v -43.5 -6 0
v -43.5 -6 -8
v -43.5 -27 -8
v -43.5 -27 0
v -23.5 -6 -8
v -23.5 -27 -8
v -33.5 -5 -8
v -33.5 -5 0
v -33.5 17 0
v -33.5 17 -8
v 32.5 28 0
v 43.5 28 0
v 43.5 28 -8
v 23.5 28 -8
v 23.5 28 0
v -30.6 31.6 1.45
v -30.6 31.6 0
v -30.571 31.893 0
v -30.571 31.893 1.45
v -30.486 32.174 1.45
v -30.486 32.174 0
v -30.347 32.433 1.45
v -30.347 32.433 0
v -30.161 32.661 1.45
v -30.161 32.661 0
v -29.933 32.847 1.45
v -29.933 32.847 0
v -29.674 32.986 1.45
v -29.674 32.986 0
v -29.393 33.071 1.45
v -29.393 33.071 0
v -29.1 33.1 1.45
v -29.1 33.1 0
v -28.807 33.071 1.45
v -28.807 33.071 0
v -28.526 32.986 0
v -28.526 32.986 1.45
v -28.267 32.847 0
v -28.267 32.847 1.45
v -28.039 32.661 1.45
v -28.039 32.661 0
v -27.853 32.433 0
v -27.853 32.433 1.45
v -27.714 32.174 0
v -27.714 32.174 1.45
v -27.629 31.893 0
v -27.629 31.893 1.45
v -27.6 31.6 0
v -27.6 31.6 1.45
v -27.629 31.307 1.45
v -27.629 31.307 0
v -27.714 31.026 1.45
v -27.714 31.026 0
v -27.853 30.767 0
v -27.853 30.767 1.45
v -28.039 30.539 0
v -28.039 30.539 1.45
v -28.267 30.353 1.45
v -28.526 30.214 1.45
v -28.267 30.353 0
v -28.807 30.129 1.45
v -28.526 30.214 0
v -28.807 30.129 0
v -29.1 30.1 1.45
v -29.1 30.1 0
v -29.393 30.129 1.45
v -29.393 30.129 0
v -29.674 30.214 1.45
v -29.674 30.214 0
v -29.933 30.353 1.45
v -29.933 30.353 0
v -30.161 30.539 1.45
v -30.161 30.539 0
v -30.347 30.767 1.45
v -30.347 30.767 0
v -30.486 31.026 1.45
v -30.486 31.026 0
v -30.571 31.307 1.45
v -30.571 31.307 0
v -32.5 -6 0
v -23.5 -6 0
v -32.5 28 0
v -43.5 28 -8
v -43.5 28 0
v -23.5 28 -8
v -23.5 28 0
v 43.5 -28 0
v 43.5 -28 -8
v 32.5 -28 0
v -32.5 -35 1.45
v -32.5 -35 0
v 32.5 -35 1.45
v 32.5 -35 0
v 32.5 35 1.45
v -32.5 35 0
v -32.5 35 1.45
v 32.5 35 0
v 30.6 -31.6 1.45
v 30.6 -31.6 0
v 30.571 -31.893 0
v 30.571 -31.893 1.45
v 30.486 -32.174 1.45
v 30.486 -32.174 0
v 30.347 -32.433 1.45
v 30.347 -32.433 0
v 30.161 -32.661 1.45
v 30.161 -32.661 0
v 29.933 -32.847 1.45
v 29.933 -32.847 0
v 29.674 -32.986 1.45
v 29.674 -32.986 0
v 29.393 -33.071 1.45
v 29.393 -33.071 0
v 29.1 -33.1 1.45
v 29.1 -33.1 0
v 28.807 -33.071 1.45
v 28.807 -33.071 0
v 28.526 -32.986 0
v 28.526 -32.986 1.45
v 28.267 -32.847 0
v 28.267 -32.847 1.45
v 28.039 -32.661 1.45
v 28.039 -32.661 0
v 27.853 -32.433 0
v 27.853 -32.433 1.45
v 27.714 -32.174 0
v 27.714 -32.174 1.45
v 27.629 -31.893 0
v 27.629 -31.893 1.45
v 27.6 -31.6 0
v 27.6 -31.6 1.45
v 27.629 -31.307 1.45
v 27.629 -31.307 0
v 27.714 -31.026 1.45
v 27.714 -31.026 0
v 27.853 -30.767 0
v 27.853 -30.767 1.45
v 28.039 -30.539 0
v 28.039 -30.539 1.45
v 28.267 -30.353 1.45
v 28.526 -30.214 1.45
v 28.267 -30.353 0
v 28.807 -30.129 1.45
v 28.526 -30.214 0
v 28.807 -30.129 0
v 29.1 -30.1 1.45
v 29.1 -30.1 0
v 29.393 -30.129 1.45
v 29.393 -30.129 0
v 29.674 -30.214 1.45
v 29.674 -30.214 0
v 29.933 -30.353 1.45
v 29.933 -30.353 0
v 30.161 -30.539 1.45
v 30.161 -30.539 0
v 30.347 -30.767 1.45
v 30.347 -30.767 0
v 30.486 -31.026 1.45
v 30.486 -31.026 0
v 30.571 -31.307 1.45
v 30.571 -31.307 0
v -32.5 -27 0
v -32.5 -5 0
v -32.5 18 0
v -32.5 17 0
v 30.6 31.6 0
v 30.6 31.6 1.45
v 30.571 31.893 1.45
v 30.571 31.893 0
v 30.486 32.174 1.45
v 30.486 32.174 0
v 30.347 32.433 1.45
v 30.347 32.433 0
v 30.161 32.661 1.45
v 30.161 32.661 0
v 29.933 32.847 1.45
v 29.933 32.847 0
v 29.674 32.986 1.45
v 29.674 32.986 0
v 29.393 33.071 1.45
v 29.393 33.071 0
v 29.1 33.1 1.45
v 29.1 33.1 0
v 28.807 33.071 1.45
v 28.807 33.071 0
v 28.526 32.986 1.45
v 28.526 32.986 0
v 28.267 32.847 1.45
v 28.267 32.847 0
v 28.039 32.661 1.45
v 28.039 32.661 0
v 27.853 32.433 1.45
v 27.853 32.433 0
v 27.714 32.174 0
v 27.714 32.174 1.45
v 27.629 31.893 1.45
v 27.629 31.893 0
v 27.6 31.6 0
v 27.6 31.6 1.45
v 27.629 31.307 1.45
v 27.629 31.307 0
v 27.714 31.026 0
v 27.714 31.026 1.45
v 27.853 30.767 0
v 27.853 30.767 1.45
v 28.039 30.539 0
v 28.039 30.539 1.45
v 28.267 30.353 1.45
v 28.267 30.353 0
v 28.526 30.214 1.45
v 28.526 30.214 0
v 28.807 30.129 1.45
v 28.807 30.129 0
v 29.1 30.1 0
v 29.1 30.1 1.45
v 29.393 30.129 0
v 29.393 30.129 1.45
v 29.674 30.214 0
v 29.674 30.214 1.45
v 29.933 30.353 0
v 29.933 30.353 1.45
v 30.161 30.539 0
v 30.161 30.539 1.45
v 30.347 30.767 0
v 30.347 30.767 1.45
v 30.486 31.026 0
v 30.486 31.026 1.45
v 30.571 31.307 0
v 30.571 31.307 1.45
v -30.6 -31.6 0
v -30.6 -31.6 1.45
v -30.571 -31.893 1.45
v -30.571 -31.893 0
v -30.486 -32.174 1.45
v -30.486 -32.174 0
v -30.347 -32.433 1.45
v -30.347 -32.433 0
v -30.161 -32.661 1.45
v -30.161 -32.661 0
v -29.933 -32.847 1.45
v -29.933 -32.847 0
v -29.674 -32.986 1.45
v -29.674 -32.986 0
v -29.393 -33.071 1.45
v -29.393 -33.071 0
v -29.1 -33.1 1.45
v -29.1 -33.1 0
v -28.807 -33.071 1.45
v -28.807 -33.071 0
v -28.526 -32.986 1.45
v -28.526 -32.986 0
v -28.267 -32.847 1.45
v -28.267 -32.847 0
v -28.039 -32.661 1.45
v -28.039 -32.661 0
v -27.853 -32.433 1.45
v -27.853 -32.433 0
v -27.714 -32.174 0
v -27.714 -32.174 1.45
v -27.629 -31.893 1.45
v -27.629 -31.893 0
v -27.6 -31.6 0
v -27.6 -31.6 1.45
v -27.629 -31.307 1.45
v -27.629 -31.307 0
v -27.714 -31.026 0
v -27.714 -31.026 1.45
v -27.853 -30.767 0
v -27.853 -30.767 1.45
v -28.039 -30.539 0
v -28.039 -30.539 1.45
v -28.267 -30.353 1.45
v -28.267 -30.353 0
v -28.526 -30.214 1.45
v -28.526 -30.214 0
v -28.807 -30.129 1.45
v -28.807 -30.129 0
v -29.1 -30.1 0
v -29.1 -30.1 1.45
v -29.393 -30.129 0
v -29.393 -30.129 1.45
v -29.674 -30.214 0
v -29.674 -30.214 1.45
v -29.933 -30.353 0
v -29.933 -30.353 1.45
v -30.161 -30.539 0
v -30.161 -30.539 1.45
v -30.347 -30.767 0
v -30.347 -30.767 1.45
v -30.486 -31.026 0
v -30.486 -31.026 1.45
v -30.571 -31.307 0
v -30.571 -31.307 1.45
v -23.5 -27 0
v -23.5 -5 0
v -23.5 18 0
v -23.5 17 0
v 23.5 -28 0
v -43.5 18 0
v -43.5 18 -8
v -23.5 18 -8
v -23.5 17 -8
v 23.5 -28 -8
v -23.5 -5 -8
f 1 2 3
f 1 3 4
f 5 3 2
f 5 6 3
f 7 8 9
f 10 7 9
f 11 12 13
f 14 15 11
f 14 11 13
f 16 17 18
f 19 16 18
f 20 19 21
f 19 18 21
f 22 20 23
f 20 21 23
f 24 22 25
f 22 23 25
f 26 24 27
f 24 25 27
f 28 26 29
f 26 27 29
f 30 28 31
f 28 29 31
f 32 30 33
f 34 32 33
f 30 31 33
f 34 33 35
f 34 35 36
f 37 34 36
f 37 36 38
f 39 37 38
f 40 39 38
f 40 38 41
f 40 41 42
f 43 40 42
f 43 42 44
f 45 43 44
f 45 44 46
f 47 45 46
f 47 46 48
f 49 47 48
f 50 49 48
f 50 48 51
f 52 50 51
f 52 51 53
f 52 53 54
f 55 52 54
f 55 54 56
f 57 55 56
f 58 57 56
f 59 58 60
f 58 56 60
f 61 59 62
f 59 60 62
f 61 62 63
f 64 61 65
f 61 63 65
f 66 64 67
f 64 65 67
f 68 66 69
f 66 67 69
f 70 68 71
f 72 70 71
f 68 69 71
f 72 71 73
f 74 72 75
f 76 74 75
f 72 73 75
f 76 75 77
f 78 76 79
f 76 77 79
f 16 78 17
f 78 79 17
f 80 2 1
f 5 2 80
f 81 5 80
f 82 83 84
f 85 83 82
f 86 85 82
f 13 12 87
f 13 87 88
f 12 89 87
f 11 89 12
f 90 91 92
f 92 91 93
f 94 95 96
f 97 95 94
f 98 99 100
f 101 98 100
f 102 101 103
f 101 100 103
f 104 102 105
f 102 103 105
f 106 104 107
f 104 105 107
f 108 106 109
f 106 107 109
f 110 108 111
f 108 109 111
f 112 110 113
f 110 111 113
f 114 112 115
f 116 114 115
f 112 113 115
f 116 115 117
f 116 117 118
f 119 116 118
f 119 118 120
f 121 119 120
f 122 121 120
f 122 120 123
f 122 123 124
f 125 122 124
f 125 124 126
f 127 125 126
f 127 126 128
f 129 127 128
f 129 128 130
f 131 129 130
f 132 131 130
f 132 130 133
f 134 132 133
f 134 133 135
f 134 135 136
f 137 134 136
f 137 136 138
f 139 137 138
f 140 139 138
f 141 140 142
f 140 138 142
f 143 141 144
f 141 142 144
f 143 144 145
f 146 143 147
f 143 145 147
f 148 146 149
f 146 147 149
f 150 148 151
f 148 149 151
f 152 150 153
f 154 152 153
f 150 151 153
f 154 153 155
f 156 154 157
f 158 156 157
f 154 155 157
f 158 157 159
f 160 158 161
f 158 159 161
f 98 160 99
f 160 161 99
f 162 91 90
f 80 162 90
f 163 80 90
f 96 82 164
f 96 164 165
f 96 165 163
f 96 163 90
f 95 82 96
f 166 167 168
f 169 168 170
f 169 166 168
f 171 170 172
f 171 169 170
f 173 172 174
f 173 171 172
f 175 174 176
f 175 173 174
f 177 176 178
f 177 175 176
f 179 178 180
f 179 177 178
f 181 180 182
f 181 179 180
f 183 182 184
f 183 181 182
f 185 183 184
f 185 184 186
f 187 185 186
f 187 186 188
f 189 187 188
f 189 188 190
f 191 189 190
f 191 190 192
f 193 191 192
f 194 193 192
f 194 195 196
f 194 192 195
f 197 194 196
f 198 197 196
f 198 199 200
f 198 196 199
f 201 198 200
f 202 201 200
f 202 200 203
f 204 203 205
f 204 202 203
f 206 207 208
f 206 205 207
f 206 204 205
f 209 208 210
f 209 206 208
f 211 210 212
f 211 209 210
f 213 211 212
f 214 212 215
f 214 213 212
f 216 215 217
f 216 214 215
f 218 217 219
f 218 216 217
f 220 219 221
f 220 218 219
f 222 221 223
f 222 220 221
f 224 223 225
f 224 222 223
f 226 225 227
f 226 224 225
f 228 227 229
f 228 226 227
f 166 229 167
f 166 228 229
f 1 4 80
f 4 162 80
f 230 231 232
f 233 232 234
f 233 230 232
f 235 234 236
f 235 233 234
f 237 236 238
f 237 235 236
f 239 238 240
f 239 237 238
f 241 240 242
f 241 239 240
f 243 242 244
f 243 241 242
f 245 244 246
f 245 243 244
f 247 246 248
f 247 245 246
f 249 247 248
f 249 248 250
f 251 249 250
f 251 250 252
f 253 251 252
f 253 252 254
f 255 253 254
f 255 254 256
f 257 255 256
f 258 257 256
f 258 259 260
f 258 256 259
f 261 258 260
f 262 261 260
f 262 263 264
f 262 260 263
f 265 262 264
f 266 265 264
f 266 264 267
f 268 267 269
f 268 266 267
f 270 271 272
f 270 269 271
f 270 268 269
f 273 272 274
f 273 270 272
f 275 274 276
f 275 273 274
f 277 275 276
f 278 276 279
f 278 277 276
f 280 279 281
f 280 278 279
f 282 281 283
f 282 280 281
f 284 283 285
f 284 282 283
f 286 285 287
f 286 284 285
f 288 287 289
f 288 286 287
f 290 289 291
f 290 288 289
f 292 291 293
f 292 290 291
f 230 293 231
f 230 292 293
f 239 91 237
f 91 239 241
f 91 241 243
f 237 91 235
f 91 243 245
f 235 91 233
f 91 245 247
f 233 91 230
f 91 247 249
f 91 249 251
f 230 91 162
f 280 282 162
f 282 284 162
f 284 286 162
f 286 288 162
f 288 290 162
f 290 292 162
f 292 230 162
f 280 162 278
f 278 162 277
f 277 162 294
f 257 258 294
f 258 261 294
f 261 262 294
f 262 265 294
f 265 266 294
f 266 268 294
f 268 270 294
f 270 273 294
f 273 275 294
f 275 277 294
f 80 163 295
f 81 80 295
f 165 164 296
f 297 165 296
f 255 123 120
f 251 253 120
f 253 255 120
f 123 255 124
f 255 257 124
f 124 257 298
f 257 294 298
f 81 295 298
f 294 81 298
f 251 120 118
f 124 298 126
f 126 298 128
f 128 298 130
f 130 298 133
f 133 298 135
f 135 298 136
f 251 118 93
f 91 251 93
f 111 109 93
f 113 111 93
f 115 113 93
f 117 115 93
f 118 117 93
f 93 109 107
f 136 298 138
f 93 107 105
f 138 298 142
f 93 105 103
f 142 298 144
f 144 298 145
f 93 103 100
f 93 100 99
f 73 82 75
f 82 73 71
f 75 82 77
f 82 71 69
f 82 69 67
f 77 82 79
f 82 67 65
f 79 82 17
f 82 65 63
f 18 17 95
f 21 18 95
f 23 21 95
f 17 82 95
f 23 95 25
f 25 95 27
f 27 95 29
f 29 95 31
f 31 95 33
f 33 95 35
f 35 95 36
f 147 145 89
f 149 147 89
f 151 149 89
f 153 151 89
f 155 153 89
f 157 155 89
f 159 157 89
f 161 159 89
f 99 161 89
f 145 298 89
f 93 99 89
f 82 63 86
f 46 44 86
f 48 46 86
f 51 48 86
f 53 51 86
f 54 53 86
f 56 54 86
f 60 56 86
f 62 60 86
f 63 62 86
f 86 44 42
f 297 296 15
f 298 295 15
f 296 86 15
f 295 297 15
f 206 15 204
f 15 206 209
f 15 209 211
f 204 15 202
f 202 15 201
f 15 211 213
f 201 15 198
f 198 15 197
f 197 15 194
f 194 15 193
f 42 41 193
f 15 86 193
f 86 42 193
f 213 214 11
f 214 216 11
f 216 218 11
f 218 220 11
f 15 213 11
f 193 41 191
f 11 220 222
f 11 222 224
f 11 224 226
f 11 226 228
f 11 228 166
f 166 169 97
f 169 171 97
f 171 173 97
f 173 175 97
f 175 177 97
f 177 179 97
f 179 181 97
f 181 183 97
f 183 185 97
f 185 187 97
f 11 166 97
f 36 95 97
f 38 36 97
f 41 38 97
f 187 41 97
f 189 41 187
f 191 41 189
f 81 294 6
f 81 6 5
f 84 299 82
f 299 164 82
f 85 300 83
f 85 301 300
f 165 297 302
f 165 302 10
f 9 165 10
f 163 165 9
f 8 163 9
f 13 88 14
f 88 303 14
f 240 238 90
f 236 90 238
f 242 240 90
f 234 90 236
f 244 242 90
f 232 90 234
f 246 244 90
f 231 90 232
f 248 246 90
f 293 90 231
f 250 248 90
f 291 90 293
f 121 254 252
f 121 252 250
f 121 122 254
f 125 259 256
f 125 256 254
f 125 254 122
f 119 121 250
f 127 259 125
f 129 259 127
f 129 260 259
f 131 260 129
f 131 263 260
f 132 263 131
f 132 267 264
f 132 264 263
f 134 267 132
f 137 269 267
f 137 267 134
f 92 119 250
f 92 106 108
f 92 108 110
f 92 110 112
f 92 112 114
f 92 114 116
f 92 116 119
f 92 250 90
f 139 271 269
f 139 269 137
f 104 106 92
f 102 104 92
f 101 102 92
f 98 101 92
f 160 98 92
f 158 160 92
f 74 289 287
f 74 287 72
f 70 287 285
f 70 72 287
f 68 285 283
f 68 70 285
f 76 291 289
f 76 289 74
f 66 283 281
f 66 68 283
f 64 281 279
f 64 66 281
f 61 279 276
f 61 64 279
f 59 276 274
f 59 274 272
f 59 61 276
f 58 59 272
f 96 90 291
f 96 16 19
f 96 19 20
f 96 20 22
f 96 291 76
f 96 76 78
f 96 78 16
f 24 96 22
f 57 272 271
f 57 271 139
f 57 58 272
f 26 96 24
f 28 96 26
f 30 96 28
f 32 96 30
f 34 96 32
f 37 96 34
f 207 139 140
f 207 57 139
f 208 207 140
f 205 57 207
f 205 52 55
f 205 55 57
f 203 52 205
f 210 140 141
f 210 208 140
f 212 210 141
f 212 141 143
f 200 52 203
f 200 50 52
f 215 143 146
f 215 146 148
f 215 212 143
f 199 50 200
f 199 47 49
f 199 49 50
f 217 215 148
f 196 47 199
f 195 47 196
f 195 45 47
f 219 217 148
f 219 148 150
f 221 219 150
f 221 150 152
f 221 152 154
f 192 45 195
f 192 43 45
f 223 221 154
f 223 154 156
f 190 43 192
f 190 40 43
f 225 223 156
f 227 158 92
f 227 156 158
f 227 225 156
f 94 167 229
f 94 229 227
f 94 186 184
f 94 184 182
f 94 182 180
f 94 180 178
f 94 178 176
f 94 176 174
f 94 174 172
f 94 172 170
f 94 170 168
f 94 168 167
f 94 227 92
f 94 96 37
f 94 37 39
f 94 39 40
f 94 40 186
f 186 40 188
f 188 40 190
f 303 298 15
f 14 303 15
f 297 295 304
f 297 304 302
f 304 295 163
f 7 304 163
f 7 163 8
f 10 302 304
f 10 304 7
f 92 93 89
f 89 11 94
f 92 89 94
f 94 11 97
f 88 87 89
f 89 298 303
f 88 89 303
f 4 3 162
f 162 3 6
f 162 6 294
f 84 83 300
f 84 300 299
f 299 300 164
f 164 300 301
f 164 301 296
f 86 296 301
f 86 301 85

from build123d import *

# Parameters (mm, degrees)
SKETCH_1_W               = 65
SKETCH_1_H               = 70
EXTRUDE_1_DEPTH          = 1.45
SKETCH_2_R               = 1.5
CUT_EXTRUDE_1_DEPTH      = 2.45
MIRROR_2_COPY_1_SKETCH_R = 1.5
MIRROR_2_COPY_1_DEPTH    = 2.45
SKETCH_3_W               = 10
SKETCH_3_H               = 56
EXTRUDE_3_DEPTH          = 8
SKETCH_4_W               = 10
SKETCH_4_H               = 10
EXTRUDE_4_DEPTH          = 8
SKETCH_5_W               = 10
SKETCH_5_H               = 22
EXTRUDE_5_DEPTH          = 8
SKETCH_6_W               = 10
SKETCH_6_H               = 21
EXTRUDE_6_DEPTH          = 8
SKETCH_7_W               = 8
SKETCH_7_H               = 21
EXTRUDE_7_DEPTH          = 10
SKETCH_9_W               = 8
SKETCH_9_H               = 10
EXTRUDE_9_DEPTH          = 10
SKETCH_10_W              = 8
SKETCH_10_H              = 56
EXTRUDE_10_DEPTH         = 10


with BuildPart() as part:
    # 草圖1 → 填料-伸長1 (new body)
    with BuildSketch(Plane.XY):
        Rectangle(SKETCH_1_W, SKETCH_1_H)
    extrude(amount=EXTRUDE_1_DEPTH)

    # 草圖2 → 除料-伸長1 (cut, through all)
    with BuildSketch(Plane(origin=(0, 0, 0), x_dir=(-1, 0, 0), z_dir=(0, 0, -1))):
        with Locations((29.1, 31.6)):
            Circle(SKETCH_2_R)
    cut_extrude_1 = extrude(amount=-CUT_EXTRUDE_1_DEPTH, mode=Mode.SUBTRACT)

    # 鏡射1: 除料-伸長1 across plane
    add(cut_extrude_1.mirror(Plane(origin=(0, 0, 0), x_dir=(0, 0, 1), z_dir=(1, 0, 0))), mode=Mode.SUBTRACT)

    # 鏡射2: 除料-伸長1 across plane
    add(cut_extrude_1.mirror(Plane.ZX), mode=Mode.SUBTRACT)

    # 鏡射2 copy 1 sketch → 鏡射2 copy 1 (cut, through all)
    with BuildSketch(Plane(origin=(0, 0, 0), x_dir=(1, 0, 0), z_dir=(0, 0, -1))):
        with Locations((29.1, 31.6)):
            Circle(MIRROR_2_COPY_1_SKETCH_R)
    extrude(amount=-MIRROR_2_COPY_1_DEPTH, mode=Mode.SUBTRACT)

    # 草圖3 → 填料-伸長3 (add)
    with BuildSketch(Plane(origin=(0, 0, 0), x_dir=(-1, 0, 0), z_dir=(0, 0, -1))):
        with Locations((-28.5, 0)):
            Rectangle(SKETCH_3_W, SKETCH_3_H)
    extrude(amount=EXTRUDE_3_DEPTH)

    # 草圖4 → 填料-伸長4 (add)
    with BuildSketch(Plane(origin=(0, 0, 0), x_dir=(-1, 0, 0), z_dir=(0, 0, -1))):
        with Locations((28.5, 23)):
            Rectangle(SKETCH_4_W, SKETCH_4_H)
    extrude(amount=EXTRUDE_4_DEPTH)

    # 草圖5 → 填料-伸長5 (add)
    with BuildSketch(Plane(origin=(0, 0, 0), x_dir=(-1, 0, 0), z_dir=(0, 0, -1))):
        with Locations((28.5, 6)):
            Rectangle(SKETCH_5_W, SKETCH_5_H)
    extrude(amount=EXTRUDE_5_DEPTH)

    # 草圖6 → 填料-伸長6 (add)
    with BuildSketch(Plane(origin=(0, 0, 0), x_dir=(-1, 0, 0), z_dir=(0, 0, -1))):
        with Locations((28.5, -16.5)):
            Rectangle(SKETCH_6_W, SKETCH_6_H)
    extrude(amount=EXTRUDE_6_DEPTH)

    # 草圖7 → 填料-伸長7 (add)
    with BuildSketch(Plane.ZY.offset(33.5)):
        with Locations((-4, -16.5)):
            Rectangle(SKETCH_7_W, SKETCH_7_H)
    extrude(amount=EXTRUDE_7_DEPTH)

    # 草圖9 → 填料-伸長9 (add)
    with BuildSketch(Plane.ZY.offset(33.5)):
        with Locations((-4, 23)):
            Rectangle(SKETCH_9_W, SKETCH_9_H)
    extrude(amount=EXTRUDE_9_DEPTH)

    # 草圖10 → 填料-伸長10 (add)
    with BuildSketch(Plane(origin=(33.5, 0, 0), x_dir=(0, 0, -1), z_dir=(1, 0, 0))):
        with Locations((4, 0)):
            Rectangle(SKETCH_10_W, SKETCH_10_H)
    extrude(amount=EXTRUDE_10_DEPTH)


solid = part.part
